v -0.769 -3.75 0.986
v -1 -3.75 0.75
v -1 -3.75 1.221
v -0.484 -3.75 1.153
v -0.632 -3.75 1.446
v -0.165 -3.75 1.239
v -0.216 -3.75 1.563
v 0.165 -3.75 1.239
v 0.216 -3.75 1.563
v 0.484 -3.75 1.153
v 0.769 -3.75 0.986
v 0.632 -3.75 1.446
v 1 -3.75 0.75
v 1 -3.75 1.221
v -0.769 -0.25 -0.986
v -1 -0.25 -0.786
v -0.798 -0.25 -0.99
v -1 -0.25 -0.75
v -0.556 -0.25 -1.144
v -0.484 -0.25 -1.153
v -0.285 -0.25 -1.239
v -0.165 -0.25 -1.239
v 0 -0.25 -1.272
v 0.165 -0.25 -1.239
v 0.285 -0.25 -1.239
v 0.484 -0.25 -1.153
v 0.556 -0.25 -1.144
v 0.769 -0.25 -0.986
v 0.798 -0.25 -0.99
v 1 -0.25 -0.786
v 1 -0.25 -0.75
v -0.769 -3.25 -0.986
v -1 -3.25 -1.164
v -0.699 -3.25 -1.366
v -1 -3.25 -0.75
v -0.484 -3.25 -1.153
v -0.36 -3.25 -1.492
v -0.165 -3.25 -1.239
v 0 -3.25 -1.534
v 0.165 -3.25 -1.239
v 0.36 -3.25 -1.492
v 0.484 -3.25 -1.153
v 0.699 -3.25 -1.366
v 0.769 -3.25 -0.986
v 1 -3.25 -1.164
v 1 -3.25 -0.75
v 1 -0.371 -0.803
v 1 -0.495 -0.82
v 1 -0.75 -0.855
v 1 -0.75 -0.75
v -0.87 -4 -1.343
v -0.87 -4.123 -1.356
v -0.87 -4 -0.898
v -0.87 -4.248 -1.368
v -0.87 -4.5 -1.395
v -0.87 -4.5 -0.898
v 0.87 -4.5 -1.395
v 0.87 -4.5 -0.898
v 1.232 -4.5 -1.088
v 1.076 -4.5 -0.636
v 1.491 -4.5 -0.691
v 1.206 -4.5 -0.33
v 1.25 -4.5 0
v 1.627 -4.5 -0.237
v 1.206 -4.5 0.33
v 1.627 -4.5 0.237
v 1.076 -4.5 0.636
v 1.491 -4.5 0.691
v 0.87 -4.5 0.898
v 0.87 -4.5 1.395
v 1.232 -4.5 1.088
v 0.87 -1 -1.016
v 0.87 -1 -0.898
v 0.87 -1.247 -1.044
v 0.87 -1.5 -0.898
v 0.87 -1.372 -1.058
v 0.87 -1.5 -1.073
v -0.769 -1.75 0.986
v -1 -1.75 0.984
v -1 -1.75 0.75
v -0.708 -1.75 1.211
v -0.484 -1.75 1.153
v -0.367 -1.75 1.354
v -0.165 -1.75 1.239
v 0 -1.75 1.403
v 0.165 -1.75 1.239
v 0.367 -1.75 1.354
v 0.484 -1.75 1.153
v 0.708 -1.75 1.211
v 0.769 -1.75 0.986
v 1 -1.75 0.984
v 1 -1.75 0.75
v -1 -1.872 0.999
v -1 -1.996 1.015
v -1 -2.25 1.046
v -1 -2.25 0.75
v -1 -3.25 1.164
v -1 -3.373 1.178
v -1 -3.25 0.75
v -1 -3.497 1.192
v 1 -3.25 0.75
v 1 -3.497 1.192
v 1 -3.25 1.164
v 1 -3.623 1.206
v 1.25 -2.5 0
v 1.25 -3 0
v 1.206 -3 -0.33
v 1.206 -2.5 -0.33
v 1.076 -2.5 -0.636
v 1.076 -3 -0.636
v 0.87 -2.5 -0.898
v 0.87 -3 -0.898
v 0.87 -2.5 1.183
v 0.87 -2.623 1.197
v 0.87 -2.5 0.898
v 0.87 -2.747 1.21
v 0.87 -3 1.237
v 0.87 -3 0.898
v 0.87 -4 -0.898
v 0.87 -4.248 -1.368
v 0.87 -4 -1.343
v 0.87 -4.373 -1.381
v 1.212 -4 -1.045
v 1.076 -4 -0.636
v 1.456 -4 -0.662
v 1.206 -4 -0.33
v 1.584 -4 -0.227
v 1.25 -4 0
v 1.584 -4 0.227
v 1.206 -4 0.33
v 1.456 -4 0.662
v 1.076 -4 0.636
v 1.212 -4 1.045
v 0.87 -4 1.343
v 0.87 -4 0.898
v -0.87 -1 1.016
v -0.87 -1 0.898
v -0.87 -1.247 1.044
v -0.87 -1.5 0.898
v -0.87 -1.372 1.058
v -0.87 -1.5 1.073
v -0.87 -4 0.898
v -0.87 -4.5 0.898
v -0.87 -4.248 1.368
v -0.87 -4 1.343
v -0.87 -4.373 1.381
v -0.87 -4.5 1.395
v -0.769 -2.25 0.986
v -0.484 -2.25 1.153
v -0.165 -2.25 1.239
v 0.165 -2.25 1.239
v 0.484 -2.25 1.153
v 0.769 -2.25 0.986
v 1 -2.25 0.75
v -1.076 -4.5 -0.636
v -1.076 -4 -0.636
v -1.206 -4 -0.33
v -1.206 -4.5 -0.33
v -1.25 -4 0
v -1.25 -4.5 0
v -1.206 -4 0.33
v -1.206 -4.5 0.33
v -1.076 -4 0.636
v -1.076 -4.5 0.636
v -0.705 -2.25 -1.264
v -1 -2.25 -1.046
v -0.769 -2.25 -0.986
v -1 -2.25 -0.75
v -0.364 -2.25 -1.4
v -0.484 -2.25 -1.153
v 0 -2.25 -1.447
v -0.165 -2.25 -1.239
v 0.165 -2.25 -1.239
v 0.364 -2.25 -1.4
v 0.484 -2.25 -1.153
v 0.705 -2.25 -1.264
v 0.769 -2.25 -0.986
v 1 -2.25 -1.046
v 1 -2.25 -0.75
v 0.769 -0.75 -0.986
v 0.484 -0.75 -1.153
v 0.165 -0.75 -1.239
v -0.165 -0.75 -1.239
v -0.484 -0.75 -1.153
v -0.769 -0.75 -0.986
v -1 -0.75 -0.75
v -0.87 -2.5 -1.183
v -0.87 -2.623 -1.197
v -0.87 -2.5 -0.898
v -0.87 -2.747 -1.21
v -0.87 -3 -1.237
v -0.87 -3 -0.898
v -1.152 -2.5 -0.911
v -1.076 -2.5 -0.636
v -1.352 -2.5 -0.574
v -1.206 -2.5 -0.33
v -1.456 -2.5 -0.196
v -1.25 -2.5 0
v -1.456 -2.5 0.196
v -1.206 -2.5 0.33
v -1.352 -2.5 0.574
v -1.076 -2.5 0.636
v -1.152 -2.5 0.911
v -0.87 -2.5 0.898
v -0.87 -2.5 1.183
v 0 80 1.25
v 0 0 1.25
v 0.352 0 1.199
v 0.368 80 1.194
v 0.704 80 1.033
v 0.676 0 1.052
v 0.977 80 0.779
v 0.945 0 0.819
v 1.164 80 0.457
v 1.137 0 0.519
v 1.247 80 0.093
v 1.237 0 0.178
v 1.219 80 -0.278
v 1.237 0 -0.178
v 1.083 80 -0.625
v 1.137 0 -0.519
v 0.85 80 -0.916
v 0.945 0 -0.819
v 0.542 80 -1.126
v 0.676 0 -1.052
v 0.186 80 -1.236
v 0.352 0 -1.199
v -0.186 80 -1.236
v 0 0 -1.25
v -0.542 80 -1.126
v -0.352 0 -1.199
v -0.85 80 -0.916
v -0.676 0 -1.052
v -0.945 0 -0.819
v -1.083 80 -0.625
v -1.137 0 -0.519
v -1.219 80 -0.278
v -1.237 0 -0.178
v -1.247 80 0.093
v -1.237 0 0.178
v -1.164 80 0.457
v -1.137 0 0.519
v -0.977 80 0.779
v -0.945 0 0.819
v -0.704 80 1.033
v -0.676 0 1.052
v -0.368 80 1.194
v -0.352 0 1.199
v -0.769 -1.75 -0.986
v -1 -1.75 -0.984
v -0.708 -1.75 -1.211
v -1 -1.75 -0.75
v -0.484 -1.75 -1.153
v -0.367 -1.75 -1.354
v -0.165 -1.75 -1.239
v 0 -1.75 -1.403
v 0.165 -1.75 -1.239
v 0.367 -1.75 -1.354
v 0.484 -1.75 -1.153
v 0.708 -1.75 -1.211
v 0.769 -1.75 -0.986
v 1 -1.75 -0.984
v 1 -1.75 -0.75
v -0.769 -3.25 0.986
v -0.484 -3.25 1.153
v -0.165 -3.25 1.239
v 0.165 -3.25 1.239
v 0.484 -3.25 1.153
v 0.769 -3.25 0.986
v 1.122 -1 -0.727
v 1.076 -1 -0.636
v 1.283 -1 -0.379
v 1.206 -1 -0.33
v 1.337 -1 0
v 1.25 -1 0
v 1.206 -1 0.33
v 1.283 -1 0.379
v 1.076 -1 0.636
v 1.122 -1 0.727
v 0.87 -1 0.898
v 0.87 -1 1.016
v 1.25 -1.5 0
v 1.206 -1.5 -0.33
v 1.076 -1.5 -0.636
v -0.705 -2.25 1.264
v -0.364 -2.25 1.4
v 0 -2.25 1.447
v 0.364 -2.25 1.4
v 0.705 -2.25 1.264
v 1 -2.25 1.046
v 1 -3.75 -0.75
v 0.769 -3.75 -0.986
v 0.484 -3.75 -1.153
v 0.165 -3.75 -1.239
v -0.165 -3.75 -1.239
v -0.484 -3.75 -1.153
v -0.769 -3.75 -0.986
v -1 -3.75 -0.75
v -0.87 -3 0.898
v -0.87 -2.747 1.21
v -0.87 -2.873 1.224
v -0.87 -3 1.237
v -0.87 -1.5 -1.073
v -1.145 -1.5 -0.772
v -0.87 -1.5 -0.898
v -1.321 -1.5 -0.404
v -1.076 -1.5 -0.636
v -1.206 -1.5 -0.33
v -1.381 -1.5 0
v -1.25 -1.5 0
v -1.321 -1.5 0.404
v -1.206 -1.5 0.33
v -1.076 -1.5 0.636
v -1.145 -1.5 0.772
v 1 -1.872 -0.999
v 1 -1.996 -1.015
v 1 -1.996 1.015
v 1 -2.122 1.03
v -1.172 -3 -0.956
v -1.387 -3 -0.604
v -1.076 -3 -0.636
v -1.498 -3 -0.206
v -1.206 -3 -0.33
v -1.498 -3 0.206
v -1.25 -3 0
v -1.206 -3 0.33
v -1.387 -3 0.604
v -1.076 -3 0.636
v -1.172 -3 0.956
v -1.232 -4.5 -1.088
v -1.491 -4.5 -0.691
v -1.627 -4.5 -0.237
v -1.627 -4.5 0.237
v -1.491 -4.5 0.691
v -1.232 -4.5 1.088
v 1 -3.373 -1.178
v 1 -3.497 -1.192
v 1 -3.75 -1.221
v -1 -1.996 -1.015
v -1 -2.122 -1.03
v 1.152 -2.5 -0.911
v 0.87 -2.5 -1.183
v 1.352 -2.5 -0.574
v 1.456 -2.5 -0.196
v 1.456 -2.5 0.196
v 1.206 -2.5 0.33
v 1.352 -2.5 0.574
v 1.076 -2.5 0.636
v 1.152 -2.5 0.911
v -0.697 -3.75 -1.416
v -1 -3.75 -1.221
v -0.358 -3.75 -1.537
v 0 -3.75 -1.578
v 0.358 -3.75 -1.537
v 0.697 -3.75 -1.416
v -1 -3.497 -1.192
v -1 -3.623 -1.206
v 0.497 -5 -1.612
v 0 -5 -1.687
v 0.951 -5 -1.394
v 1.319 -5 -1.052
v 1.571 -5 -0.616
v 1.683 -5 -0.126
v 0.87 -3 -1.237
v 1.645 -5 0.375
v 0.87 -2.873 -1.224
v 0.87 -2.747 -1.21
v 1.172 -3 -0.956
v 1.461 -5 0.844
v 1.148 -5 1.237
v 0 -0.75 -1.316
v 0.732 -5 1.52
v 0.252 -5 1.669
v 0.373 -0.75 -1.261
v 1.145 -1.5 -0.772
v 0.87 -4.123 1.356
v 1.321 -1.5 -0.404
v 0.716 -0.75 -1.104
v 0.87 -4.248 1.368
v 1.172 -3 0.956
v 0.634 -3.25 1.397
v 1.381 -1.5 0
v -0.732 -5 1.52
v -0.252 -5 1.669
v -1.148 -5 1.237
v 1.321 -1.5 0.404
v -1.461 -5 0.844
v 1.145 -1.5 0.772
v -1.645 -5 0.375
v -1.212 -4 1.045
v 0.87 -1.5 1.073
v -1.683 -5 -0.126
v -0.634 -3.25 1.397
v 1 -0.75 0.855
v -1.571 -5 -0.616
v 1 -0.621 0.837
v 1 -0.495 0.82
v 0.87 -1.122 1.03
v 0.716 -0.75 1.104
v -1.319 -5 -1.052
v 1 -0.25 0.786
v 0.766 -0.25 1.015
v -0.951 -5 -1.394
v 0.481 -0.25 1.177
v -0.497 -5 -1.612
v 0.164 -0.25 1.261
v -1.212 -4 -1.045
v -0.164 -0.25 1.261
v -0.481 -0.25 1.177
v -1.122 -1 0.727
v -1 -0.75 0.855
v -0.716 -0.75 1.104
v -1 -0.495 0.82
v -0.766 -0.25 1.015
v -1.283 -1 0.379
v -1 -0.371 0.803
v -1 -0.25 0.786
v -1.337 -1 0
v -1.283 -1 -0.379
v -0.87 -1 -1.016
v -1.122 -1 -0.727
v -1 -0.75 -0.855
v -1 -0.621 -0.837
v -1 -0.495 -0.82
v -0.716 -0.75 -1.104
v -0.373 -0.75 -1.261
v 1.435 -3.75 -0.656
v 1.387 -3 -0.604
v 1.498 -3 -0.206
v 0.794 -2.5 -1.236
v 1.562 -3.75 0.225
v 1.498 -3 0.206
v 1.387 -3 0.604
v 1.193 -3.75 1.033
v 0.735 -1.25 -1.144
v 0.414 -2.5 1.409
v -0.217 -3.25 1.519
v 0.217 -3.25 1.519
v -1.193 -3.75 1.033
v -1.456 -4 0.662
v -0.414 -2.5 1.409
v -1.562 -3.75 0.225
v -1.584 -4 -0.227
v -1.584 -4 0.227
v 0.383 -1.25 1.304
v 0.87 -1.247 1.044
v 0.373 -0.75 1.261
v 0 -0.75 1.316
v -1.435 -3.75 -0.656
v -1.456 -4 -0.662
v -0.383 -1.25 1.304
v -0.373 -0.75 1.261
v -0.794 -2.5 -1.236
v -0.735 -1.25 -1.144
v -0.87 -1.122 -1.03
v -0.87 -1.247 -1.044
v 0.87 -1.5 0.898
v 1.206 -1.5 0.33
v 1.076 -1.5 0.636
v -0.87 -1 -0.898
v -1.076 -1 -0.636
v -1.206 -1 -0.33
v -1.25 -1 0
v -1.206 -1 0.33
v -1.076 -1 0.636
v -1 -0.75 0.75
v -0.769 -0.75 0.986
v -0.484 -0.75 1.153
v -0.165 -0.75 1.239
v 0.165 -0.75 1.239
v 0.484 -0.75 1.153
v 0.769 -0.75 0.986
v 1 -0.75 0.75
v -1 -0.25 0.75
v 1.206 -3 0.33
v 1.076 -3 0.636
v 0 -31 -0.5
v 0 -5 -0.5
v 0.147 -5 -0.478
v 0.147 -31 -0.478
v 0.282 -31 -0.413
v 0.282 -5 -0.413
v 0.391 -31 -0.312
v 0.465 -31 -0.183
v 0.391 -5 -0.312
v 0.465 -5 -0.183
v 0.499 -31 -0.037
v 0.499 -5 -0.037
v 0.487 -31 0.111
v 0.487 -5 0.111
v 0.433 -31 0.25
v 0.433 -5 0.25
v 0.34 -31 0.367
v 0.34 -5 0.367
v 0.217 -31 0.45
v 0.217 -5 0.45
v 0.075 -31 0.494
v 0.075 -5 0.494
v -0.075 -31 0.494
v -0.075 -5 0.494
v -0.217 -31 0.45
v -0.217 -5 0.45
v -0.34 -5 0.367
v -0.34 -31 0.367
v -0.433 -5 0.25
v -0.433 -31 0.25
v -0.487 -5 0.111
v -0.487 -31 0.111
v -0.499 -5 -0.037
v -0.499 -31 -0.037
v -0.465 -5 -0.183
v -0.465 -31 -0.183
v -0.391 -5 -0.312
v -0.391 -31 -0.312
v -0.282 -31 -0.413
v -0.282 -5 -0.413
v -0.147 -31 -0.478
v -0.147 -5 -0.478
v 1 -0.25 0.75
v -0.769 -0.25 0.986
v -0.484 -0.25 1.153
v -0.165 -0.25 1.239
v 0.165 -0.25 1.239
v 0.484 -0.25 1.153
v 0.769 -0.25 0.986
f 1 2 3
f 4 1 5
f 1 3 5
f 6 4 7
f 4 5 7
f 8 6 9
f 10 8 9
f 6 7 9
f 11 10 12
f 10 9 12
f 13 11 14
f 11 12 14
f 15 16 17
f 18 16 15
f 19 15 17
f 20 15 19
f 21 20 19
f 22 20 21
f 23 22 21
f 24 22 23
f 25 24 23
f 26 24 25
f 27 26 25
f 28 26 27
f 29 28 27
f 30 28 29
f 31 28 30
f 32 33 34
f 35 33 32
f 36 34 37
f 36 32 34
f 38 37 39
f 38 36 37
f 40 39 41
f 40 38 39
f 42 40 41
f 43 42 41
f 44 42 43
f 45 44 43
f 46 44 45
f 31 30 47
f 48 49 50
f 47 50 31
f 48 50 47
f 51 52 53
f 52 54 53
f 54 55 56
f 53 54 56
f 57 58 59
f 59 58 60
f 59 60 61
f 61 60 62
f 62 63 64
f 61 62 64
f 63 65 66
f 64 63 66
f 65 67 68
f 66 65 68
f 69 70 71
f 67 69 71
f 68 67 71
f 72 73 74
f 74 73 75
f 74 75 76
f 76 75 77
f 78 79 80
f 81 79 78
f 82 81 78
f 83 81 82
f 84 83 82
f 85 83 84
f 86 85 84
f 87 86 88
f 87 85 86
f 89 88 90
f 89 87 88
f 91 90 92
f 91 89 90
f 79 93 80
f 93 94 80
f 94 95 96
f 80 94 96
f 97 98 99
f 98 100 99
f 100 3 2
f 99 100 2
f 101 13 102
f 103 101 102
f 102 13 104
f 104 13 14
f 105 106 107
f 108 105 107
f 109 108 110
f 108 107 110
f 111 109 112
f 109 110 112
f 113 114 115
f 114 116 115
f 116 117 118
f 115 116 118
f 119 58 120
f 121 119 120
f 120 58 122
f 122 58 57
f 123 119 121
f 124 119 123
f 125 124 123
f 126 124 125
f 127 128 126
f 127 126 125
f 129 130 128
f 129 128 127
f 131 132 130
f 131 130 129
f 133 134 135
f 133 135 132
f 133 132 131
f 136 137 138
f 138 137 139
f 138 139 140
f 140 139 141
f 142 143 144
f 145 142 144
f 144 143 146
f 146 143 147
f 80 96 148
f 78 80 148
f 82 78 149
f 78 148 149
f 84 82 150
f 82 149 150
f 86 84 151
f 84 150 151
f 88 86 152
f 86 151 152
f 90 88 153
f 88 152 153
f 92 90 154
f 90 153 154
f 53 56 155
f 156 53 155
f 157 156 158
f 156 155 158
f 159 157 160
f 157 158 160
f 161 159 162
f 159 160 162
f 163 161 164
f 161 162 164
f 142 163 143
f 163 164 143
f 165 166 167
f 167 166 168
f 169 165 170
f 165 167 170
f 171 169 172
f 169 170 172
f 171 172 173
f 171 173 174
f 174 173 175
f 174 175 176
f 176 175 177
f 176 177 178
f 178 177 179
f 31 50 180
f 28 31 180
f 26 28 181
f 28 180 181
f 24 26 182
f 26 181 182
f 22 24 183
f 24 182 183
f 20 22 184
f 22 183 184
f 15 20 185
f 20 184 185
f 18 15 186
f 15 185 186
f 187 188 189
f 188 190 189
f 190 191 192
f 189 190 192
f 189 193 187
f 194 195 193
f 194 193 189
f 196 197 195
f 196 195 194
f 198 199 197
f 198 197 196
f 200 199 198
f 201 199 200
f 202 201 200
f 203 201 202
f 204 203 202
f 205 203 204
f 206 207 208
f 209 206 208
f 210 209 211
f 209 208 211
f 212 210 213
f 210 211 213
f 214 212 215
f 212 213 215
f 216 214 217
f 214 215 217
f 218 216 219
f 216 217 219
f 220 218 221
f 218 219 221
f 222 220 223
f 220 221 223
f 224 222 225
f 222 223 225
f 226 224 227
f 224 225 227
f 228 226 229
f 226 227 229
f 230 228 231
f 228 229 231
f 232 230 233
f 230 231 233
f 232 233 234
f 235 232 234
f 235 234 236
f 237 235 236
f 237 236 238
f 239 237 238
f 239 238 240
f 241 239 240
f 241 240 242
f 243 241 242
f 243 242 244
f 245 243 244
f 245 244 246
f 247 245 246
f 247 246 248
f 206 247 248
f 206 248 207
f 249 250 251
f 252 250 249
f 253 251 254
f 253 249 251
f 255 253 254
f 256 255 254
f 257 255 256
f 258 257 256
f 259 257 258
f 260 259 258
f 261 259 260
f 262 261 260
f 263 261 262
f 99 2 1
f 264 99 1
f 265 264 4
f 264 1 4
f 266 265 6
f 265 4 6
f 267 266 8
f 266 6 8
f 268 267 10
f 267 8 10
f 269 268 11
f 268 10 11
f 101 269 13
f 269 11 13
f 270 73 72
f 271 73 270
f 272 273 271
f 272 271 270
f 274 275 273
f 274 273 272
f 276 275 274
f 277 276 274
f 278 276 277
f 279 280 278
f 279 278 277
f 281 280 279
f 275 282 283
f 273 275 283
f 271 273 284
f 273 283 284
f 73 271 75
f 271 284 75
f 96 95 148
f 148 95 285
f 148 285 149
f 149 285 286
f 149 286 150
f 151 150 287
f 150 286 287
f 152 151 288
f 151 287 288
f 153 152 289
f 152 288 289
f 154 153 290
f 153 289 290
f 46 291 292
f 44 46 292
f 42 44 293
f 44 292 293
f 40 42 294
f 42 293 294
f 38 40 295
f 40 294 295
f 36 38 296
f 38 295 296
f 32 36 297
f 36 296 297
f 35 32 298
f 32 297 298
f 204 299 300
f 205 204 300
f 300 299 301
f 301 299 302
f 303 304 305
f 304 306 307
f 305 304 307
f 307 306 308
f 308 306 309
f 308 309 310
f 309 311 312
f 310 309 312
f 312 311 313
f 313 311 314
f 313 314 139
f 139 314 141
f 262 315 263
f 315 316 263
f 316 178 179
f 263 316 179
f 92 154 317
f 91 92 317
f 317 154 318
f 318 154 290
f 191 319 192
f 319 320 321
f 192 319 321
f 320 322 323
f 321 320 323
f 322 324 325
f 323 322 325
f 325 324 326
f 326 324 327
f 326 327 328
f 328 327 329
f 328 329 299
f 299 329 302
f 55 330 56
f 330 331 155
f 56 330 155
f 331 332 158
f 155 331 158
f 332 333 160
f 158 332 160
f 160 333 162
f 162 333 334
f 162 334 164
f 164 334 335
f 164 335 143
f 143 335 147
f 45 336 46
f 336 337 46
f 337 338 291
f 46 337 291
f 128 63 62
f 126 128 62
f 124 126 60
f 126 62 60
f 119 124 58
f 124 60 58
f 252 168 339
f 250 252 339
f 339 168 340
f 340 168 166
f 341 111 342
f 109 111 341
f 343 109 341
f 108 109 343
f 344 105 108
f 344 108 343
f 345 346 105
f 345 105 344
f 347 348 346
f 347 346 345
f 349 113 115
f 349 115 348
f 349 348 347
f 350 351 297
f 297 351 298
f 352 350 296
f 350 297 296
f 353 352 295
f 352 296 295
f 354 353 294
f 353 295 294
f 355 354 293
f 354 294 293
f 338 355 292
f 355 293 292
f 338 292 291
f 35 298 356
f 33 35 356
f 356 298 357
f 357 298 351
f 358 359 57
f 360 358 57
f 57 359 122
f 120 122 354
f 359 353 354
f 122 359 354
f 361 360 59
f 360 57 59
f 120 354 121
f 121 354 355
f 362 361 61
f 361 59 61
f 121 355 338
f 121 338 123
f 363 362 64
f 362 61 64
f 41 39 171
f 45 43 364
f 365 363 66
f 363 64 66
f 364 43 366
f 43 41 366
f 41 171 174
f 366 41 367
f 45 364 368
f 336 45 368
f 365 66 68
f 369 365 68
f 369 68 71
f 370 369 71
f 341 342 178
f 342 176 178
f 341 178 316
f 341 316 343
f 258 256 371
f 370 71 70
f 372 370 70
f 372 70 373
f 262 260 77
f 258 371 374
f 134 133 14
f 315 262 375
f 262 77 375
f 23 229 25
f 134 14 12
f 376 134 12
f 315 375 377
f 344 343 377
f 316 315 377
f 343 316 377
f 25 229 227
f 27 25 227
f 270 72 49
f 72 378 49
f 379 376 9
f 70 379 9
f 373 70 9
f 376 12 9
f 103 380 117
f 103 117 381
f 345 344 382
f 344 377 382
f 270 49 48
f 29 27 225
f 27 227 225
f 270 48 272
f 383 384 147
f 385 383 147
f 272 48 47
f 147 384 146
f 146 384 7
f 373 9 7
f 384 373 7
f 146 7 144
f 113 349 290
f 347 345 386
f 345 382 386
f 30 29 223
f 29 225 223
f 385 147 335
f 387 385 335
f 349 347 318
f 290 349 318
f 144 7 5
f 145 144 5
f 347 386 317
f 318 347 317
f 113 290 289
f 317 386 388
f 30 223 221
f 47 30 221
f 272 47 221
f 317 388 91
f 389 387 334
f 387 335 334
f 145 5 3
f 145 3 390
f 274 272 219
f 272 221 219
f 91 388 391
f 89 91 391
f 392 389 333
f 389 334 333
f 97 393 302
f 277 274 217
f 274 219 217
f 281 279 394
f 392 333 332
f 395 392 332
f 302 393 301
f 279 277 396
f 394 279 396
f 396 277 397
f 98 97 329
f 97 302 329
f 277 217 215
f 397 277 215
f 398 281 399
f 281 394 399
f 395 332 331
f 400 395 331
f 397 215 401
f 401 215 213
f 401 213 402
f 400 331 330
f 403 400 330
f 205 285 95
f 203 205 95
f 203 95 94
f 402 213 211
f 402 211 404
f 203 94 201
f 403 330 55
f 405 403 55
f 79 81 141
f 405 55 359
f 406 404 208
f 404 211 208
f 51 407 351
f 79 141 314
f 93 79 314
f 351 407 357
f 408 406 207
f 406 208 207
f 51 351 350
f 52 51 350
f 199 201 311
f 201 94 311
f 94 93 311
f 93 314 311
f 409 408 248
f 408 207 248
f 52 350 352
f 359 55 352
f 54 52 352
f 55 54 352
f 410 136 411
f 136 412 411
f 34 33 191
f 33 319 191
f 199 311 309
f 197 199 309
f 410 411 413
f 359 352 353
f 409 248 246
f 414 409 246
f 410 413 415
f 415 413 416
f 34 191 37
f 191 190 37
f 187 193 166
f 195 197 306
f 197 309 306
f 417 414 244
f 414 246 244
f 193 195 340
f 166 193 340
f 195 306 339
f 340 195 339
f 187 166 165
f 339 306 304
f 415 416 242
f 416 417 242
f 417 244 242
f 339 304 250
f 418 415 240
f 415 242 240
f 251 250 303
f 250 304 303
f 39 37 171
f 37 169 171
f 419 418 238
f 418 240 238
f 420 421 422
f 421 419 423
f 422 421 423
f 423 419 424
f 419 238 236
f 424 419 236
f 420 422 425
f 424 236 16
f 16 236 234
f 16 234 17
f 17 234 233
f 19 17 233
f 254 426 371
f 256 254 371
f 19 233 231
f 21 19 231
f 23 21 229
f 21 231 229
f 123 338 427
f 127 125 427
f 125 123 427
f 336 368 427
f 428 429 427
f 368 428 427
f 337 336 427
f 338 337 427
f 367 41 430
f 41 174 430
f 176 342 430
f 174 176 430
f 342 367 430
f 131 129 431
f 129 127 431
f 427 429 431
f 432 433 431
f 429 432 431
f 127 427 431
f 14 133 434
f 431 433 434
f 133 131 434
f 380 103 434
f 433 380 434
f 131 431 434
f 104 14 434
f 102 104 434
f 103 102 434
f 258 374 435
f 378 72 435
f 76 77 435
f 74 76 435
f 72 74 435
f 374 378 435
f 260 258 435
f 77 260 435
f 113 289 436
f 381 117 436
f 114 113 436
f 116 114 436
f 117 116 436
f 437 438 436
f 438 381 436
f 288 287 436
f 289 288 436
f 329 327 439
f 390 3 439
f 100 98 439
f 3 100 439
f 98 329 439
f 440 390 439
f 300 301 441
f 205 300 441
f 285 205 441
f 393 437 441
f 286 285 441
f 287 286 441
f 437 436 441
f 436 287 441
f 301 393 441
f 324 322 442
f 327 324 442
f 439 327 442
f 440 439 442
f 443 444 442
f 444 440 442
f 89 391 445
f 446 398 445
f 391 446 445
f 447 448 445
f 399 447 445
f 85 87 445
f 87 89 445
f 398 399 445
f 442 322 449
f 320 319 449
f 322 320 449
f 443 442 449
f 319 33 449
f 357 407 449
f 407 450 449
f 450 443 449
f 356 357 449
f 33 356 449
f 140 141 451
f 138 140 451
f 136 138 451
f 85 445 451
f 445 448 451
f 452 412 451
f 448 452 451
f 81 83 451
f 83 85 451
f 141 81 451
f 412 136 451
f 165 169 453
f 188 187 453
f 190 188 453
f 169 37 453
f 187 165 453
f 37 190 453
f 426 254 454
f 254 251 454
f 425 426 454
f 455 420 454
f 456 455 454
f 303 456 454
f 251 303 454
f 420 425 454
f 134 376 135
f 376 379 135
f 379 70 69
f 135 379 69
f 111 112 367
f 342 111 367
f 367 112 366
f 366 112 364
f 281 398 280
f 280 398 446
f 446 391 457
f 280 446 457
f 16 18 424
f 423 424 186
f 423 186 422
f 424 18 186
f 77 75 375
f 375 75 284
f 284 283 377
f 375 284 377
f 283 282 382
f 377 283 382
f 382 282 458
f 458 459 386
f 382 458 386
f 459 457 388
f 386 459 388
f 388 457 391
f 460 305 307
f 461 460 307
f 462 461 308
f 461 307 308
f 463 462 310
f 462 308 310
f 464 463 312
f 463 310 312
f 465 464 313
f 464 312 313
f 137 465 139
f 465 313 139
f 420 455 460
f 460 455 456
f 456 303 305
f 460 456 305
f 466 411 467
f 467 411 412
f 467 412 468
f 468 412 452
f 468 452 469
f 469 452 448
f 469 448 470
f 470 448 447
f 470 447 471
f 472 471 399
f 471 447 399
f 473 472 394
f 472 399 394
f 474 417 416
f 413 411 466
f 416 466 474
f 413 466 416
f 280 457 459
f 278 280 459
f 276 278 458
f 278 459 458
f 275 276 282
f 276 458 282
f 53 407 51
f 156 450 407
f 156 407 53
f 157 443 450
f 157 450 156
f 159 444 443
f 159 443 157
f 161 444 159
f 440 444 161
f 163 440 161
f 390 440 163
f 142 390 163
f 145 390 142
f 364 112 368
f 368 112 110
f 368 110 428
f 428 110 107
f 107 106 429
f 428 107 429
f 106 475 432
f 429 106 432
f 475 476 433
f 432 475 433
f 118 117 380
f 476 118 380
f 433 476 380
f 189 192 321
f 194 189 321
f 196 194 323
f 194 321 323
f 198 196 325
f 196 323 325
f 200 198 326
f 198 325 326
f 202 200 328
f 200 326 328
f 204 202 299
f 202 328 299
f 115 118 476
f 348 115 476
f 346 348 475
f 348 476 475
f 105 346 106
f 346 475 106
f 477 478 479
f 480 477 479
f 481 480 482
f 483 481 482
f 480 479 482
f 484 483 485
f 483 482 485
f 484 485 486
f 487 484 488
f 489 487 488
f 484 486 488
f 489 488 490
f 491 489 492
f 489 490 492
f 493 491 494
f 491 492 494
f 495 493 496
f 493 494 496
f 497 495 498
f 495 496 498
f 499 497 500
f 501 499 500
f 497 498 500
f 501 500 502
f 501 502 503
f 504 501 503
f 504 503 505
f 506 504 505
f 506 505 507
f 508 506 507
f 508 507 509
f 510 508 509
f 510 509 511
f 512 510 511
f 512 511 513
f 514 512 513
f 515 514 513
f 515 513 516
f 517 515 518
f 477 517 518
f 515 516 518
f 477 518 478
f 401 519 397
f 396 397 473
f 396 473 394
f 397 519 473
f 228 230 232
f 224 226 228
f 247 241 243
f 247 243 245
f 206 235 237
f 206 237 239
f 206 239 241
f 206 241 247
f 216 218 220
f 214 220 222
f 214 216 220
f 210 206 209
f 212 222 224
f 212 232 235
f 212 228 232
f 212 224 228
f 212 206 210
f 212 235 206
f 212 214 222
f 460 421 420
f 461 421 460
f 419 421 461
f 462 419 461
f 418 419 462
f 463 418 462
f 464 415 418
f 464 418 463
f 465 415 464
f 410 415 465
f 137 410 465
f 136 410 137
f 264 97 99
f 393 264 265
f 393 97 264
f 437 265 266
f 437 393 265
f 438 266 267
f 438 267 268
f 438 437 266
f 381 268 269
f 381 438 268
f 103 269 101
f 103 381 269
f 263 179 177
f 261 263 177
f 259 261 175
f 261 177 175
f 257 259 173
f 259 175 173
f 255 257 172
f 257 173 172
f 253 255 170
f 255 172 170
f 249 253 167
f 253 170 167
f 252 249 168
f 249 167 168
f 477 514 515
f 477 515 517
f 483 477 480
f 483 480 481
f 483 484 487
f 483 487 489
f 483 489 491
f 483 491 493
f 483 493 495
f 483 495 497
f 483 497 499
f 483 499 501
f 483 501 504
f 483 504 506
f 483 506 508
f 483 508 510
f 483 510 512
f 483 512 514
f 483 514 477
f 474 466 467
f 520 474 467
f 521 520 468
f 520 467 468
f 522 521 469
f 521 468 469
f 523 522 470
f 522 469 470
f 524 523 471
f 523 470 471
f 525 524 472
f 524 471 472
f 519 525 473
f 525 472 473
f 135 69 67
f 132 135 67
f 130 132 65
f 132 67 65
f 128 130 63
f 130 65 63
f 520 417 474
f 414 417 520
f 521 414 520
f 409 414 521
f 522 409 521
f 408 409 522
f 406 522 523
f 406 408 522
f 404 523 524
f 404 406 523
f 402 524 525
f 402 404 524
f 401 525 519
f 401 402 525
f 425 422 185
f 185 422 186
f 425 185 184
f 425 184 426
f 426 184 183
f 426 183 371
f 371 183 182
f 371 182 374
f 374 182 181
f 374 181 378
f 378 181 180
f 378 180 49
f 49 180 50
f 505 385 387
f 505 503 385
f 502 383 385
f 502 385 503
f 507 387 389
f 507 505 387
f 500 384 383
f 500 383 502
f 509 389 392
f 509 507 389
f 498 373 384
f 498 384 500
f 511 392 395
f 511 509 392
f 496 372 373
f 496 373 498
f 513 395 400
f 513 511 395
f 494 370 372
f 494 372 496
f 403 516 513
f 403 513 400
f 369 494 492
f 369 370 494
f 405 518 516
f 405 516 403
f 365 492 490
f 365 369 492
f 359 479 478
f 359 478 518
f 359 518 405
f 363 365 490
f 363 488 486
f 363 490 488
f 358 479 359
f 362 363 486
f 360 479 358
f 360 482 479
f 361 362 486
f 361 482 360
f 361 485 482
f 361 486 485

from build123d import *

# Parameters (mm, degrees)
SKETCH2_R           = 1.25
BOSS_EXTRUDE1_DEPTH = 80
SKETCH3_R           = 1.25
BOSS_EXTRUDE2_DEPTH = 5
BOSS_EXTRUDE2_DRAFT = -5
CUT_EXTRUDE3_START  = -0.5
CUT_EXTRUDE3_DEPTH  = 0.5
LPATTERN1_COUNT     = 3
LPATTERN1_PITCH     = 1.5
CUT_EXTRUDE4_START  = -1.25
CUT_EXTRUDE4_DEPTH  = 0.5
LPATTERN2_COUNT     = 3
LPATTERN2_PITCH     = 1.5
SKETCH7_R           = 0.5
BOSS_EXTRUDE3_DEPTH = 26


with BuildPart() as part:
    # Sketch2 → Boss-Extrude1 (new body)
    with BuildSketch(Plane(origin=(0, 0, 0), x_dir=(1, 0, 0), z_dir=(0, 1, 0))):
        with Locations(Location((0, 0, 0), (0, 0, 270))):
            Circle(SKETCH2_R)
    extrude(amount=BOSS_EXTRUDE1_DEPTH)


with BuildPart() as boss_extrude2_tool:
    # Sketch3 → Boss-Extrude2 (with draft: the straight prism first)
    with BuildSketch(Plane.XZ):
        with Locations(Location((0, 0, 0), (0, 0, 270))):
            Circle(SKETCH3_R)
    extrude(amount=BOSS_EXTRUDE2_DEPTH)
    # Boss-Extrude2: the draft: its side faces are tilted about the plane it starts from
    boss_extrude2_sides = [boss_extrude2_tool.faces().sort_by_distance(p)[0] for p in [
        (0, -2.5, 1.25),
    ]]
    draft(boss_extrude2_sides, Plane.XZ, BOSS_EXTRUDE2_DRAFT)


with BuildPart() as part_1:
    add(part.part)

    # Boss-Extrude2: add boss_extrude2_tool
    add(boss_extrude2_tool.part)

    # Sketch4 → Cut-Extrude3 (cut)
    with BuildSketch(Plane.XZ.offset(5).offset(CUT_EXTRUDE3_START)):
        with BuildLine():
            Line((-0.87, 0.897552227), (-0.87, 1.445878608))
            ThreePointArc((-0.87, 1.445878608), (-1.687443318, 0), (-0.87, -1.445878608))
            Line((-0.87, -1.445878608), (-0.87, -0.897552227))
            ThreePointArc((-0.87, -0.897552227), (-1.25, 0), (-0.87, 0.897552227))
        make_face()
        with BuildLine():
            ThreePointArc((1.687443318, 0), (1.468935097, 0.830478556), (0.87, 1.445878608))
            Line((0.87, 1.445878608), (0.87, 0.897552227))
            ThreePointArc((0.87, 0.897552227), (1.151086443, 0.487339717), (1.25, 0))
            ThreePointArc((1.25, 0), (1.151086443, -0.487339717), (0.87, -0.897552227))
            Line((0.87, -0.897552227), (0.87, -1.445878608))
            ThreePointArc((0.87, -1.445878608), (1.468935097, -0.830478556), (1.687443318, 0))
        make_face()
    cut_extrude3 = extrude(amount=-CUT_EXTRUDE3_DEPTH, mode=Mode.SUBTRACT)

    # LPattern1: Cut-Extrude3 ×3
    with Locations(*[(0, i * LPATTERN1_PITCH, 0) for i in range(1, LPATTERN1_COUNT)]):
        add(cut_extrude3, mode=Mode.SUBTRACT)

    # Sketch6 → Cut-Extrude4 (cut)
    with BuildSketch(Plane.XZ.offset(5).offset(CUT_EXTRUDE4_START)):
        with BuildLine():
            Line((-1, 1.359214829), (-1, 0.75))
            ThreePointArc((-1, 0.75), (0, 1.25), (1, 0.75))
            Line((1, 0.75), (1, 1.359214829))
            ThreePointArc((1, 1.359214829), (0, 1.687443318), (-1, 1.359214829))
        make_face()
        with BuildLine():
            ThreePointArc((1, -0.75), (0, -1.25), (-1, -0.75))
            Line((-1, -0.75), (-1, -1.359214829))
            ThreePointArc((-1, -1.359214829), (0, -1.687443318), (1, -1.359214829))
            Line((1, -1.359214829), (1, -0.75))
        make_face()
    cut_extrude4 = extrude(amount=-CUT_EXTRUDE4_DEPTH, mode=Mode.SUBTRACT)

    # LPattern2: Cut-Extrude4 ×3
    with Locations(*[(0, i * LPATTERN2_PITCH, 0) for i in range(1, LPATTERN2_COUNT)]):
        add(cut_extrude4, mode=Mode.SUBTRACT)

    # Sketch7 → Boss-Extrude3 (add)
    with BuildSketch(Plane.XZ.offset(5)):
        with Locations(Location((0, 0, 0), (0, 0, 270))):
            Circle(SKETCH7_R)
    extrude(amount=BOSS_EXTRUDE3_DEPTH)


solid = part_1.part
